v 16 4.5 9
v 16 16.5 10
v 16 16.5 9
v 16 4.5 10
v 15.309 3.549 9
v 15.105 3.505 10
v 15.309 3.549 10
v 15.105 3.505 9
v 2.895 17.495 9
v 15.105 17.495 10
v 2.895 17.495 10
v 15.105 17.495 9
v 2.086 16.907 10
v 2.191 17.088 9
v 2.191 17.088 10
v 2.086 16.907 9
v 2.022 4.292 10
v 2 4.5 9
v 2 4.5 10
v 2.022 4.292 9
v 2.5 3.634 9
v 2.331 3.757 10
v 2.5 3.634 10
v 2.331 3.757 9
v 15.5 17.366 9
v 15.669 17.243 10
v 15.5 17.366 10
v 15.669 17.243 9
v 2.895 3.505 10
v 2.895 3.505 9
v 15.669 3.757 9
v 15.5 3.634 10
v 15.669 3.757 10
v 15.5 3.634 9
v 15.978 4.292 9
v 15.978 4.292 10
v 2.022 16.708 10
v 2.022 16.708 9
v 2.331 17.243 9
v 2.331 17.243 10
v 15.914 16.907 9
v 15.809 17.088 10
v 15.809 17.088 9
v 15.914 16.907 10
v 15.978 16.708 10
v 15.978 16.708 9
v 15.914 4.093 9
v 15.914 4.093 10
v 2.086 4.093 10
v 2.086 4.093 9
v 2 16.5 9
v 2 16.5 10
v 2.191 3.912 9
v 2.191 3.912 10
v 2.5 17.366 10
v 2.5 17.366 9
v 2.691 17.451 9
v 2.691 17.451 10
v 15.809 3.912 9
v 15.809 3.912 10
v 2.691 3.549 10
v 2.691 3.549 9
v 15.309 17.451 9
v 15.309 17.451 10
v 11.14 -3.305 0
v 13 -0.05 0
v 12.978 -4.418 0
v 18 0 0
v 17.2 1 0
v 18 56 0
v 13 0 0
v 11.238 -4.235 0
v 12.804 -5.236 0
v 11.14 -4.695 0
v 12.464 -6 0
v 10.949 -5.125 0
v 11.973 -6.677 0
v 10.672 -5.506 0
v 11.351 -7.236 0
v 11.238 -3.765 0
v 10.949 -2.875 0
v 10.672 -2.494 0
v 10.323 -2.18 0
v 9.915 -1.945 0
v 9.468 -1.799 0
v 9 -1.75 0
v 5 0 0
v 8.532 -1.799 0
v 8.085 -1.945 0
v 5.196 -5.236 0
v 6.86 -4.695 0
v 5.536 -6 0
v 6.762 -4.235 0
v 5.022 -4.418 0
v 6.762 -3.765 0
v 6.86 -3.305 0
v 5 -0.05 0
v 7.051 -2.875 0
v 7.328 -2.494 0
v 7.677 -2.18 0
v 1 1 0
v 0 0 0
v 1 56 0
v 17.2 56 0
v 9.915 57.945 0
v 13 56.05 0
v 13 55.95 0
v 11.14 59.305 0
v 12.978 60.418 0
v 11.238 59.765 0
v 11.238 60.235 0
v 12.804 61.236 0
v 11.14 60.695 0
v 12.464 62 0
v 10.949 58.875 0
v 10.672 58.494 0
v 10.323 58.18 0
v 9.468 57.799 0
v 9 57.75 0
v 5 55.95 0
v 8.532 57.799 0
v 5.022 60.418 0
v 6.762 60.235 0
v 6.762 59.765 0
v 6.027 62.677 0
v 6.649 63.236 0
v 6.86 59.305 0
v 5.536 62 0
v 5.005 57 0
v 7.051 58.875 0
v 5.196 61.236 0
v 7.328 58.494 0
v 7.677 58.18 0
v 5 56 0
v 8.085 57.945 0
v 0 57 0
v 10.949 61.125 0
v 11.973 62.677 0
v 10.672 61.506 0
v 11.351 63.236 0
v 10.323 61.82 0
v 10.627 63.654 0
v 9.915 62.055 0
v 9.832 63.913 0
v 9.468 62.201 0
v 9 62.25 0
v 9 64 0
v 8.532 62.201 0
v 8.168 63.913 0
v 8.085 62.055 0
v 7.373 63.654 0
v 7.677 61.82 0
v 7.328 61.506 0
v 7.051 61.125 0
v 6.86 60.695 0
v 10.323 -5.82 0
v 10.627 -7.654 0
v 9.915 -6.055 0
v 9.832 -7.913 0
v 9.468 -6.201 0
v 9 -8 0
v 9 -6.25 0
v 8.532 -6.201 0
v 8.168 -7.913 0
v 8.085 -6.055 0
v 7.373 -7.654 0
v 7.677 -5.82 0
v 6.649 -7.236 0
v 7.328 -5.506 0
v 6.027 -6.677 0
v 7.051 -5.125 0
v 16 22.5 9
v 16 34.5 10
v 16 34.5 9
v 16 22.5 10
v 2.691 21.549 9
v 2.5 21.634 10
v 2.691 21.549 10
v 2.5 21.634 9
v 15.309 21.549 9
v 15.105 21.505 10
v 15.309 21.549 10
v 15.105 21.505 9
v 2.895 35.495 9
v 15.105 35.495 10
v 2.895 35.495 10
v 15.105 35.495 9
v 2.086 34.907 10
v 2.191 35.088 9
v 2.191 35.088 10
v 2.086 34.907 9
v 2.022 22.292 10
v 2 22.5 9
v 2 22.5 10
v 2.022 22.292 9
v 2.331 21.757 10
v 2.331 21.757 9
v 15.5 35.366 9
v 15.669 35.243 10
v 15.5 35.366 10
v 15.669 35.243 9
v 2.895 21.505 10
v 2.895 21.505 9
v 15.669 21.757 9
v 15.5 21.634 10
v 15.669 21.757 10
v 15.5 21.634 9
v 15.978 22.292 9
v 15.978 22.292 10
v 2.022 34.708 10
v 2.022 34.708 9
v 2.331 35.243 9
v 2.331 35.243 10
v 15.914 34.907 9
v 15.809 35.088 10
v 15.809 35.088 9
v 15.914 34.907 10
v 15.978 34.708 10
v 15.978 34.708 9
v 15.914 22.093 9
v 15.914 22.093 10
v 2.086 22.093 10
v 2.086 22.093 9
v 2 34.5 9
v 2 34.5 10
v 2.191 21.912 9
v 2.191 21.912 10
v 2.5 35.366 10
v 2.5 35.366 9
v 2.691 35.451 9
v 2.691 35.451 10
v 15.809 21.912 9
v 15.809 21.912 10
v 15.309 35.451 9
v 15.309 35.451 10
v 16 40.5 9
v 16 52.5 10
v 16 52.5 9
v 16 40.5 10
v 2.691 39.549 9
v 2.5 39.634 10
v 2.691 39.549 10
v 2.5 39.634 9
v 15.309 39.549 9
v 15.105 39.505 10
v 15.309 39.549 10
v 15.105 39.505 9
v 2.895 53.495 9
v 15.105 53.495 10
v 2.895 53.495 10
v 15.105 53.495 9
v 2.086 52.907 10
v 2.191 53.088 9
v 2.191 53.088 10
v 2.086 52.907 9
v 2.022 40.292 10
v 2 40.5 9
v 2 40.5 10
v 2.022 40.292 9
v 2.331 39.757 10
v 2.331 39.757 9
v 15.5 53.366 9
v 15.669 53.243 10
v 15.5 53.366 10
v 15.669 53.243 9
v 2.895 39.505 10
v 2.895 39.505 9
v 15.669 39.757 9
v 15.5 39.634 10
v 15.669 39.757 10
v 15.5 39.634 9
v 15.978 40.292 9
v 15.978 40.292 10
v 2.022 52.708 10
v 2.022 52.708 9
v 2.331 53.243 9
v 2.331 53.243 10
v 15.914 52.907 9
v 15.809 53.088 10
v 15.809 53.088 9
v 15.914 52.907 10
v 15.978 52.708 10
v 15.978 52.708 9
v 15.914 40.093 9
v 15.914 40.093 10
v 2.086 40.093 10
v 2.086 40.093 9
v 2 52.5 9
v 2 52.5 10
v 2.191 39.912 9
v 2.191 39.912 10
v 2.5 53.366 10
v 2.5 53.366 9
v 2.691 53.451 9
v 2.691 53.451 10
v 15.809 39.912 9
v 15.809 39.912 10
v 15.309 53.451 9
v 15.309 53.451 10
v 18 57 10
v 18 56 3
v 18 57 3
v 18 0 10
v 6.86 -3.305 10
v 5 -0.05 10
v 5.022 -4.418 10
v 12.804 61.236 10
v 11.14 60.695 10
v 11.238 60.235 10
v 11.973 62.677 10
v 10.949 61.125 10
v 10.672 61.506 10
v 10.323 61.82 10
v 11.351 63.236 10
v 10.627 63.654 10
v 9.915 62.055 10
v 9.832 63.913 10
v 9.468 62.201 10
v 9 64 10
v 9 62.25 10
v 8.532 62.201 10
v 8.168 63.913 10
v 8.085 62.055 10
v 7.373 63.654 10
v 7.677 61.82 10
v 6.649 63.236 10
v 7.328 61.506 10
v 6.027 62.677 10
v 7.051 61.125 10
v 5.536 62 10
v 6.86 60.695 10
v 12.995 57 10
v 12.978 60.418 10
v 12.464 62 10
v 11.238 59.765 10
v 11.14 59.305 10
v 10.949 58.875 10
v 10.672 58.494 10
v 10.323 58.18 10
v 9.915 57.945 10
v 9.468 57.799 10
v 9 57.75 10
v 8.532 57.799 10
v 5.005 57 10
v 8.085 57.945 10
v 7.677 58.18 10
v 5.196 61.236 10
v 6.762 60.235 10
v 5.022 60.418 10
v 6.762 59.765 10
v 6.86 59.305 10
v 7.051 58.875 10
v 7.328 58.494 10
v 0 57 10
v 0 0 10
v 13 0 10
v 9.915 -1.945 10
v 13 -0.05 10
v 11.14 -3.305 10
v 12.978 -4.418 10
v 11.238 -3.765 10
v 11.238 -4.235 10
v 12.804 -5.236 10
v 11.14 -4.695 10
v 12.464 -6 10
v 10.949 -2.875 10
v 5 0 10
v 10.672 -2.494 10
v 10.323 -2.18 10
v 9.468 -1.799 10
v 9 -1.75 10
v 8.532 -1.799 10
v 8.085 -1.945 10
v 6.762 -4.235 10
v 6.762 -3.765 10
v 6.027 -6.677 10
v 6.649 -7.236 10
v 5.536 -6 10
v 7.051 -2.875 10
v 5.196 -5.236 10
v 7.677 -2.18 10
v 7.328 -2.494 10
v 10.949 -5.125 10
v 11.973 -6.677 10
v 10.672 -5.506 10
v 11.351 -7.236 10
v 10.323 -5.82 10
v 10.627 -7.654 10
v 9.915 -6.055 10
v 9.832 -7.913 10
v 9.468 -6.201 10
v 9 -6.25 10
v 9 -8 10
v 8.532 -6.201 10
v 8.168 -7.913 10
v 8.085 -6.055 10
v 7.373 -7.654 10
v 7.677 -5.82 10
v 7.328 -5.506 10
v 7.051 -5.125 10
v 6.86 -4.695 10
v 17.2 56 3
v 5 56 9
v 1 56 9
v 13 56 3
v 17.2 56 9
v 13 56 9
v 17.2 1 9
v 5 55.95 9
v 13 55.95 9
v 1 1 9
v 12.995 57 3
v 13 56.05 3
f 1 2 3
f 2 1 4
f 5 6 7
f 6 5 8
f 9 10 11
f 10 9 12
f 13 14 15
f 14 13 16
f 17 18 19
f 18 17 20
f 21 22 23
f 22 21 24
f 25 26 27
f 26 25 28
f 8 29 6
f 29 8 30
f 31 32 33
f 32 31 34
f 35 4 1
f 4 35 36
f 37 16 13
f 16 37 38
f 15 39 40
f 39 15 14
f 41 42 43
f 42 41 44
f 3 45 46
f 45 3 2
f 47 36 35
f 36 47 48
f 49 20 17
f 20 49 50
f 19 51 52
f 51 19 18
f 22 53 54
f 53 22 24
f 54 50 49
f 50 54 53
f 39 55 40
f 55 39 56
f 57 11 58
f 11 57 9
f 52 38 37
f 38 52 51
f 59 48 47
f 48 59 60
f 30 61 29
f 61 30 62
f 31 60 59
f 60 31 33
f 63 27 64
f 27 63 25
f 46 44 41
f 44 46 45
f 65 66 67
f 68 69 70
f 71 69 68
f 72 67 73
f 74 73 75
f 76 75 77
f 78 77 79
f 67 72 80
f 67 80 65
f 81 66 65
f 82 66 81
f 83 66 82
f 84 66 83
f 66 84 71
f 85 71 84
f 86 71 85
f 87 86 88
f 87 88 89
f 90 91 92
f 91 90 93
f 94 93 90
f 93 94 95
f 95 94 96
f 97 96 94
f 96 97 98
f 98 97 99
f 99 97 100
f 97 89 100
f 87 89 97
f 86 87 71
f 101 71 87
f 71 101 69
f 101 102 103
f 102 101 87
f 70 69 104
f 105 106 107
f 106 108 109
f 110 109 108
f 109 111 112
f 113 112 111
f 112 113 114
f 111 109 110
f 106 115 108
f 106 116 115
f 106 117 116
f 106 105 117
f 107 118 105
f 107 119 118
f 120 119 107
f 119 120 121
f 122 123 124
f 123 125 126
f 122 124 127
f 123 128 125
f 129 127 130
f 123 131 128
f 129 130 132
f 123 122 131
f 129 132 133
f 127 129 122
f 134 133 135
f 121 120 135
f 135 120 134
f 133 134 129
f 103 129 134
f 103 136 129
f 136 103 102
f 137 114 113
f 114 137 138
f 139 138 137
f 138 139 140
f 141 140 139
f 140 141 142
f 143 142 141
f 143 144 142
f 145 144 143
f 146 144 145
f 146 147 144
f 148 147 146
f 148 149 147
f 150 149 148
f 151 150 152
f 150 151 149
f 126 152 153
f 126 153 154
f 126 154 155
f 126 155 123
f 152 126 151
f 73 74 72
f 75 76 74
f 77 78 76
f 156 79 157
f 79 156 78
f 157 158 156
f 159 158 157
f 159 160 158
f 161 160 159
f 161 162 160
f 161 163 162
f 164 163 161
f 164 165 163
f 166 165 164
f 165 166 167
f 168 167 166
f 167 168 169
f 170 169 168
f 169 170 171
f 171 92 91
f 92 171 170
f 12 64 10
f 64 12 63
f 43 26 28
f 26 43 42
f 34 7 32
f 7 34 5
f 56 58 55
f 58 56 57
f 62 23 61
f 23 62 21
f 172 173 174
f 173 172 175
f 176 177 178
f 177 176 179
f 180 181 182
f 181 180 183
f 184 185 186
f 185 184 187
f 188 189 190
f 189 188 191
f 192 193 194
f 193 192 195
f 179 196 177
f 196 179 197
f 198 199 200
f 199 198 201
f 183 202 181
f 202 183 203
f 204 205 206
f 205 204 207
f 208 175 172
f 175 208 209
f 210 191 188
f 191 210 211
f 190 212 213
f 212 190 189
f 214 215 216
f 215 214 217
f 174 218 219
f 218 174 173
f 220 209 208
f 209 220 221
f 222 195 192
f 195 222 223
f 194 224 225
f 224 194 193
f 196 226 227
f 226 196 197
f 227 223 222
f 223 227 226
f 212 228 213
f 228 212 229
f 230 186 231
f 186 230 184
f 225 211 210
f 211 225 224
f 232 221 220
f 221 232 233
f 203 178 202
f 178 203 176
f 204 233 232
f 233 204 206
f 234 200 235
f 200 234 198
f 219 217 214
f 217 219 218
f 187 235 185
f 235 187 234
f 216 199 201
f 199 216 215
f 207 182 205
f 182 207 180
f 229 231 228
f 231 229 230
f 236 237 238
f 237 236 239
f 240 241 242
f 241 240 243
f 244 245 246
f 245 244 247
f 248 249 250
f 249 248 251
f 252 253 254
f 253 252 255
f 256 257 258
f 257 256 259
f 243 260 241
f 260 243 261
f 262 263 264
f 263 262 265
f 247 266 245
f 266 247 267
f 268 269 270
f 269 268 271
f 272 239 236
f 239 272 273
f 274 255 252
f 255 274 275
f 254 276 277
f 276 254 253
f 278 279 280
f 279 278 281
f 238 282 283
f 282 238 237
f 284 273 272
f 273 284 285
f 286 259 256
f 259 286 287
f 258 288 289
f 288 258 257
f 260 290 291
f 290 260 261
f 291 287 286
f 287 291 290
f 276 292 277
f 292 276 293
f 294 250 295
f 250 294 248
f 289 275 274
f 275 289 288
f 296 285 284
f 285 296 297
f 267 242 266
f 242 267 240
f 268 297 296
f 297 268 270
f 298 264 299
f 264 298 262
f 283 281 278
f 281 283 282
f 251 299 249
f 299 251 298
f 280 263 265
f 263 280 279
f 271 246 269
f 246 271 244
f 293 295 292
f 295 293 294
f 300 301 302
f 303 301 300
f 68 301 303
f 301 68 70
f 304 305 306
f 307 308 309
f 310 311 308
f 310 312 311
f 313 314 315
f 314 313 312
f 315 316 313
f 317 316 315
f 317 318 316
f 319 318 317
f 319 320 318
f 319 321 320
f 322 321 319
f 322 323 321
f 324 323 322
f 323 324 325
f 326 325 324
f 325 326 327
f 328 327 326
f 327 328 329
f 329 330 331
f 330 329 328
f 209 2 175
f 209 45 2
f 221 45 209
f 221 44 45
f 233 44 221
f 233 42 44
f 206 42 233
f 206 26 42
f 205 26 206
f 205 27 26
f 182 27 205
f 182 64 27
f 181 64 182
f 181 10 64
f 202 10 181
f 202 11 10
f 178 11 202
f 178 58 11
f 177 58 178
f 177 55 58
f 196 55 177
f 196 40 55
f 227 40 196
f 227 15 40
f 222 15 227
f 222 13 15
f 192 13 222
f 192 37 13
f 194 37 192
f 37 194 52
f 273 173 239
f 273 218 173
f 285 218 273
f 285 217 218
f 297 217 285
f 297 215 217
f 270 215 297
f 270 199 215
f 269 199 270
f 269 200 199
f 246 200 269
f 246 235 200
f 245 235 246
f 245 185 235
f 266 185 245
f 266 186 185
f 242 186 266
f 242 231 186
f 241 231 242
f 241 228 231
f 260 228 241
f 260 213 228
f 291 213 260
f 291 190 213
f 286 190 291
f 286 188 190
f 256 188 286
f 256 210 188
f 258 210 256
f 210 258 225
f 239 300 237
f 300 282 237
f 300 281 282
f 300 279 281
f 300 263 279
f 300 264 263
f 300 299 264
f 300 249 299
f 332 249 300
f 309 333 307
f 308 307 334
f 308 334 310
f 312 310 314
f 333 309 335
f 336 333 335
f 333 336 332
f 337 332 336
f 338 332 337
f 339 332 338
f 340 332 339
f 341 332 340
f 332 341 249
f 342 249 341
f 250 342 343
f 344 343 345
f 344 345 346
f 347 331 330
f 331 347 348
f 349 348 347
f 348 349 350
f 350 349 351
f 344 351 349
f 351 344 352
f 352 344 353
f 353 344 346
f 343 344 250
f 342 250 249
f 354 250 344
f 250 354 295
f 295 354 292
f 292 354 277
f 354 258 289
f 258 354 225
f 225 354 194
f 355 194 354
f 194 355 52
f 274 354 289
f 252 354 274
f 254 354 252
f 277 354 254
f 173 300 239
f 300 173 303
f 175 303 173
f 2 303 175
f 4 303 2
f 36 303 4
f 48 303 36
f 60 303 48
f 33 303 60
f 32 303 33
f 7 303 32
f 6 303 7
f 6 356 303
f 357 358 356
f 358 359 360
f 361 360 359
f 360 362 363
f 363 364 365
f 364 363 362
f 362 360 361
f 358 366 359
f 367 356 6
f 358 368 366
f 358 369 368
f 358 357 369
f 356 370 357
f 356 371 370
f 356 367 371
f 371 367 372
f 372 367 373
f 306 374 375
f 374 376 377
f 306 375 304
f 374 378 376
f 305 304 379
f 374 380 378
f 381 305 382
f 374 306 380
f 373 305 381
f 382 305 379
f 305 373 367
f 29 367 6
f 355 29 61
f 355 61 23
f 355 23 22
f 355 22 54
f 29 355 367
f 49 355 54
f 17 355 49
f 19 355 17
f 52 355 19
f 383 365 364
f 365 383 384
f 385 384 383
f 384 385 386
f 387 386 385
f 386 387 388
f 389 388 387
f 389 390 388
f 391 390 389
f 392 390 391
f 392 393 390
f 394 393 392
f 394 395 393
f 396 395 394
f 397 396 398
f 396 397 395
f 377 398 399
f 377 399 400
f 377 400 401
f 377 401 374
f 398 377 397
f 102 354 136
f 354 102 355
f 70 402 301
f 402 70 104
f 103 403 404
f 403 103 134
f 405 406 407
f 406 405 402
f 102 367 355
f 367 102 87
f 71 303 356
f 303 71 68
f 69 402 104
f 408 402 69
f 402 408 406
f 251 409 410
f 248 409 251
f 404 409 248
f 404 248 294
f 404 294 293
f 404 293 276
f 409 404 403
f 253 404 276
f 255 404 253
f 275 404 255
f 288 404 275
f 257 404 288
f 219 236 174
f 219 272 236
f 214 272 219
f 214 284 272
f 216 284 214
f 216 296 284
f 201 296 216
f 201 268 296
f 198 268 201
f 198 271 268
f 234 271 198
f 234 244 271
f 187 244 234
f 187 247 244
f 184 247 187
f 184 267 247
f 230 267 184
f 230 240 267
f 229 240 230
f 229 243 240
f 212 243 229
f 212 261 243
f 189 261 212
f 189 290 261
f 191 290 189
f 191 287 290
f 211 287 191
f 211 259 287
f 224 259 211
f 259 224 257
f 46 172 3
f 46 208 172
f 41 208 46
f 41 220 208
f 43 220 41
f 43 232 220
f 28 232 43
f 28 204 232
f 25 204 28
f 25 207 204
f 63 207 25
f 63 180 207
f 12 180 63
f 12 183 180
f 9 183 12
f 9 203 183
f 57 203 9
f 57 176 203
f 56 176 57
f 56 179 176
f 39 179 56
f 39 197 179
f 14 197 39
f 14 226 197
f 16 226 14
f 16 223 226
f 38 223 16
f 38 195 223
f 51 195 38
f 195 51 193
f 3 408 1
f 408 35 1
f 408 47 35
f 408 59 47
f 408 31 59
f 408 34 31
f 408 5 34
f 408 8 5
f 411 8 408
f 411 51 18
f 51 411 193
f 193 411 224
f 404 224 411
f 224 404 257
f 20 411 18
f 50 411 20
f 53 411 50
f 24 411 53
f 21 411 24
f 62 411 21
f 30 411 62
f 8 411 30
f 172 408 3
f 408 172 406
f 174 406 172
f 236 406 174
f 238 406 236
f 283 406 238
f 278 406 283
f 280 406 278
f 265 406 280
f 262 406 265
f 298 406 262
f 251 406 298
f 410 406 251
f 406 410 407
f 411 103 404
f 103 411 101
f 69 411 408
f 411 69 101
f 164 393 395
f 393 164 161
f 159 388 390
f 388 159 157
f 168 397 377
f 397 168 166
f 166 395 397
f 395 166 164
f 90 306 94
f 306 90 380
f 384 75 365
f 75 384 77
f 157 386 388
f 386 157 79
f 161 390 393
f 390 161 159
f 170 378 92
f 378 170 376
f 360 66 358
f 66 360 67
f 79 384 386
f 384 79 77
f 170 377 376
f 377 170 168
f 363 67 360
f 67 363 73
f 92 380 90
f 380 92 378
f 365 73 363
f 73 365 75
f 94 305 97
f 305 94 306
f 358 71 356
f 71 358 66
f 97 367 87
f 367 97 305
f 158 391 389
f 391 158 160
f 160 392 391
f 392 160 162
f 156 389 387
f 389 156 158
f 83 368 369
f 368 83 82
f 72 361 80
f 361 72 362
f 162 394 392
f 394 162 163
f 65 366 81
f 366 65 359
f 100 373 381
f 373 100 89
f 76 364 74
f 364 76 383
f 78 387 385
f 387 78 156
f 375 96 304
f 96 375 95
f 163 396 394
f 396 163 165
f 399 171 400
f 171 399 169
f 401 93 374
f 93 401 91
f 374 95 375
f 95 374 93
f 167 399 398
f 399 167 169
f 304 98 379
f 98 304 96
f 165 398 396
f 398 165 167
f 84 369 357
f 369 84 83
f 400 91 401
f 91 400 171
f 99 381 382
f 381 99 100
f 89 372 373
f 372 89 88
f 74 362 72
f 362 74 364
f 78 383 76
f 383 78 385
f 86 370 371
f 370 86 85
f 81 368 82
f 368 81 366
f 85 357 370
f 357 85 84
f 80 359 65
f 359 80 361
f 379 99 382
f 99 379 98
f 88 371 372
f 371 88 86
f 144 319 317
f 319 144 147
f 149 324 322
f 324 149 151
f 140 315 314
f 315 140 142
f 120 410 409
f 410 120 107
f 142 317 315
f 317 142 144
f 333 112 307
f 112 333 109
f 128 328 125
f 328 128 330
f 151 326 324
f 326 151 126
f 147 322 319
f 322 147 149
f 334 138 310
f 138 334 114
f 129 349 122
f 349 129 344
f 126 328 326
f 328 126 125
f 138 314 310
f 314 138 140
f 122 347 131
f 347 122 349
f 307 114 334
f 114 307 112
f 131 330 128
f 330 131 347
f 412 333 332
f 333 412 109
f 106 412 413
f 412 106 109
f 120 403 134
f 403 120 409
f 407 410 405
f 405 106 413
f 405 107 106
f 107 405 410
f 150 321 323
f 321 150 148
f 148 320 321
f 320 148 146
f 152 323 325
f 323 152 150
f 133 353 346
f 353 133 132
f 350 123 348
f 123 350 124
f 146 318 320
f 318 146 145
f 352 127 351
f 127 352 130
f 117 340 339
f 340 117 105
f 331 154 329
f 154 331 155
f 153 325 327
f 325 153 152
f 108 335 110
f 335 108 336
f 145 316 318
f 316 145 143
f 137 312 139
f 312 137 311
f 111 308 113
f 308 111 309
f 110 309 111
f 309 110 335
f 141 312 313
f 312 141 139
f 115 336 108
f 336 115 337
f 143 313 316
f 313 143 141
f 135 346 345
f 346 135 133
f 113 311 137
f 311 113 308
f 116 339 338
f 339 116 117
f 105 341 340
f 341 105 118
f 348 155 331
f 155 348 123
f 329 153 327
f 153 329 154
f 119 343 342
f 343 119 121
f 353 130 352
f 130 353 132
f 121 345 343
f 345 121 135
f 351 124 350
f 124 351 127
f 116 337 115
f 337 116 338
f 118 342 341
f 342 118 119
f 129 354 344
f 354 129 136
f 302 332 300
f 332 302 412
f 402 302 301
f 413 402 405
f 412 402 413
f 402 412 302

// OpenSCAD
//cube(14);

module cutout(size, r, h) {
	hull() {
		translate([r,r,0])cylinder(r=1, h=h);
		translate([size-r,r,0])cylinder(r=r, h=h);
		translate([r,size-r,0])cylinder(r=1, h=h);
		translate([size-r,size-r,0])cylinder(r=1, h=h);
	}
}

module panel_base() {
	cube([18,14*4,10]);
}

module mount() {
	d=8;
	h=10;
	difference() {
		hull() {
			translate([0,0,h/2])cube([0.1,8,h],true);
			translate([d/2,0,0])cylinder(h=10,d=d);
		}
	translate([d/2,0,0])cylinder(h=10,d=4.5);
	}
}

module panel() {
	difference() {
		panel_base();
		for (i=[0:2]) {
			translate([2,3.5+i*18,0])cutout(14,1,11,$fn=30);
		}
		translate([1,1,0])scale([0.9,1,0.9])panel_base();
	}
}

//panel();

union() {
	panel();
	rotate([0,0,-90])translate([0,9,0])mount($fn=30);
	rotate([0,0,90])translate([14*4,-9,0])mount($fn=30);
	translate([0,14*4,0])cube([10,1,10]);
	translate([8,14*4,3])cube([10,1,7]);
}
